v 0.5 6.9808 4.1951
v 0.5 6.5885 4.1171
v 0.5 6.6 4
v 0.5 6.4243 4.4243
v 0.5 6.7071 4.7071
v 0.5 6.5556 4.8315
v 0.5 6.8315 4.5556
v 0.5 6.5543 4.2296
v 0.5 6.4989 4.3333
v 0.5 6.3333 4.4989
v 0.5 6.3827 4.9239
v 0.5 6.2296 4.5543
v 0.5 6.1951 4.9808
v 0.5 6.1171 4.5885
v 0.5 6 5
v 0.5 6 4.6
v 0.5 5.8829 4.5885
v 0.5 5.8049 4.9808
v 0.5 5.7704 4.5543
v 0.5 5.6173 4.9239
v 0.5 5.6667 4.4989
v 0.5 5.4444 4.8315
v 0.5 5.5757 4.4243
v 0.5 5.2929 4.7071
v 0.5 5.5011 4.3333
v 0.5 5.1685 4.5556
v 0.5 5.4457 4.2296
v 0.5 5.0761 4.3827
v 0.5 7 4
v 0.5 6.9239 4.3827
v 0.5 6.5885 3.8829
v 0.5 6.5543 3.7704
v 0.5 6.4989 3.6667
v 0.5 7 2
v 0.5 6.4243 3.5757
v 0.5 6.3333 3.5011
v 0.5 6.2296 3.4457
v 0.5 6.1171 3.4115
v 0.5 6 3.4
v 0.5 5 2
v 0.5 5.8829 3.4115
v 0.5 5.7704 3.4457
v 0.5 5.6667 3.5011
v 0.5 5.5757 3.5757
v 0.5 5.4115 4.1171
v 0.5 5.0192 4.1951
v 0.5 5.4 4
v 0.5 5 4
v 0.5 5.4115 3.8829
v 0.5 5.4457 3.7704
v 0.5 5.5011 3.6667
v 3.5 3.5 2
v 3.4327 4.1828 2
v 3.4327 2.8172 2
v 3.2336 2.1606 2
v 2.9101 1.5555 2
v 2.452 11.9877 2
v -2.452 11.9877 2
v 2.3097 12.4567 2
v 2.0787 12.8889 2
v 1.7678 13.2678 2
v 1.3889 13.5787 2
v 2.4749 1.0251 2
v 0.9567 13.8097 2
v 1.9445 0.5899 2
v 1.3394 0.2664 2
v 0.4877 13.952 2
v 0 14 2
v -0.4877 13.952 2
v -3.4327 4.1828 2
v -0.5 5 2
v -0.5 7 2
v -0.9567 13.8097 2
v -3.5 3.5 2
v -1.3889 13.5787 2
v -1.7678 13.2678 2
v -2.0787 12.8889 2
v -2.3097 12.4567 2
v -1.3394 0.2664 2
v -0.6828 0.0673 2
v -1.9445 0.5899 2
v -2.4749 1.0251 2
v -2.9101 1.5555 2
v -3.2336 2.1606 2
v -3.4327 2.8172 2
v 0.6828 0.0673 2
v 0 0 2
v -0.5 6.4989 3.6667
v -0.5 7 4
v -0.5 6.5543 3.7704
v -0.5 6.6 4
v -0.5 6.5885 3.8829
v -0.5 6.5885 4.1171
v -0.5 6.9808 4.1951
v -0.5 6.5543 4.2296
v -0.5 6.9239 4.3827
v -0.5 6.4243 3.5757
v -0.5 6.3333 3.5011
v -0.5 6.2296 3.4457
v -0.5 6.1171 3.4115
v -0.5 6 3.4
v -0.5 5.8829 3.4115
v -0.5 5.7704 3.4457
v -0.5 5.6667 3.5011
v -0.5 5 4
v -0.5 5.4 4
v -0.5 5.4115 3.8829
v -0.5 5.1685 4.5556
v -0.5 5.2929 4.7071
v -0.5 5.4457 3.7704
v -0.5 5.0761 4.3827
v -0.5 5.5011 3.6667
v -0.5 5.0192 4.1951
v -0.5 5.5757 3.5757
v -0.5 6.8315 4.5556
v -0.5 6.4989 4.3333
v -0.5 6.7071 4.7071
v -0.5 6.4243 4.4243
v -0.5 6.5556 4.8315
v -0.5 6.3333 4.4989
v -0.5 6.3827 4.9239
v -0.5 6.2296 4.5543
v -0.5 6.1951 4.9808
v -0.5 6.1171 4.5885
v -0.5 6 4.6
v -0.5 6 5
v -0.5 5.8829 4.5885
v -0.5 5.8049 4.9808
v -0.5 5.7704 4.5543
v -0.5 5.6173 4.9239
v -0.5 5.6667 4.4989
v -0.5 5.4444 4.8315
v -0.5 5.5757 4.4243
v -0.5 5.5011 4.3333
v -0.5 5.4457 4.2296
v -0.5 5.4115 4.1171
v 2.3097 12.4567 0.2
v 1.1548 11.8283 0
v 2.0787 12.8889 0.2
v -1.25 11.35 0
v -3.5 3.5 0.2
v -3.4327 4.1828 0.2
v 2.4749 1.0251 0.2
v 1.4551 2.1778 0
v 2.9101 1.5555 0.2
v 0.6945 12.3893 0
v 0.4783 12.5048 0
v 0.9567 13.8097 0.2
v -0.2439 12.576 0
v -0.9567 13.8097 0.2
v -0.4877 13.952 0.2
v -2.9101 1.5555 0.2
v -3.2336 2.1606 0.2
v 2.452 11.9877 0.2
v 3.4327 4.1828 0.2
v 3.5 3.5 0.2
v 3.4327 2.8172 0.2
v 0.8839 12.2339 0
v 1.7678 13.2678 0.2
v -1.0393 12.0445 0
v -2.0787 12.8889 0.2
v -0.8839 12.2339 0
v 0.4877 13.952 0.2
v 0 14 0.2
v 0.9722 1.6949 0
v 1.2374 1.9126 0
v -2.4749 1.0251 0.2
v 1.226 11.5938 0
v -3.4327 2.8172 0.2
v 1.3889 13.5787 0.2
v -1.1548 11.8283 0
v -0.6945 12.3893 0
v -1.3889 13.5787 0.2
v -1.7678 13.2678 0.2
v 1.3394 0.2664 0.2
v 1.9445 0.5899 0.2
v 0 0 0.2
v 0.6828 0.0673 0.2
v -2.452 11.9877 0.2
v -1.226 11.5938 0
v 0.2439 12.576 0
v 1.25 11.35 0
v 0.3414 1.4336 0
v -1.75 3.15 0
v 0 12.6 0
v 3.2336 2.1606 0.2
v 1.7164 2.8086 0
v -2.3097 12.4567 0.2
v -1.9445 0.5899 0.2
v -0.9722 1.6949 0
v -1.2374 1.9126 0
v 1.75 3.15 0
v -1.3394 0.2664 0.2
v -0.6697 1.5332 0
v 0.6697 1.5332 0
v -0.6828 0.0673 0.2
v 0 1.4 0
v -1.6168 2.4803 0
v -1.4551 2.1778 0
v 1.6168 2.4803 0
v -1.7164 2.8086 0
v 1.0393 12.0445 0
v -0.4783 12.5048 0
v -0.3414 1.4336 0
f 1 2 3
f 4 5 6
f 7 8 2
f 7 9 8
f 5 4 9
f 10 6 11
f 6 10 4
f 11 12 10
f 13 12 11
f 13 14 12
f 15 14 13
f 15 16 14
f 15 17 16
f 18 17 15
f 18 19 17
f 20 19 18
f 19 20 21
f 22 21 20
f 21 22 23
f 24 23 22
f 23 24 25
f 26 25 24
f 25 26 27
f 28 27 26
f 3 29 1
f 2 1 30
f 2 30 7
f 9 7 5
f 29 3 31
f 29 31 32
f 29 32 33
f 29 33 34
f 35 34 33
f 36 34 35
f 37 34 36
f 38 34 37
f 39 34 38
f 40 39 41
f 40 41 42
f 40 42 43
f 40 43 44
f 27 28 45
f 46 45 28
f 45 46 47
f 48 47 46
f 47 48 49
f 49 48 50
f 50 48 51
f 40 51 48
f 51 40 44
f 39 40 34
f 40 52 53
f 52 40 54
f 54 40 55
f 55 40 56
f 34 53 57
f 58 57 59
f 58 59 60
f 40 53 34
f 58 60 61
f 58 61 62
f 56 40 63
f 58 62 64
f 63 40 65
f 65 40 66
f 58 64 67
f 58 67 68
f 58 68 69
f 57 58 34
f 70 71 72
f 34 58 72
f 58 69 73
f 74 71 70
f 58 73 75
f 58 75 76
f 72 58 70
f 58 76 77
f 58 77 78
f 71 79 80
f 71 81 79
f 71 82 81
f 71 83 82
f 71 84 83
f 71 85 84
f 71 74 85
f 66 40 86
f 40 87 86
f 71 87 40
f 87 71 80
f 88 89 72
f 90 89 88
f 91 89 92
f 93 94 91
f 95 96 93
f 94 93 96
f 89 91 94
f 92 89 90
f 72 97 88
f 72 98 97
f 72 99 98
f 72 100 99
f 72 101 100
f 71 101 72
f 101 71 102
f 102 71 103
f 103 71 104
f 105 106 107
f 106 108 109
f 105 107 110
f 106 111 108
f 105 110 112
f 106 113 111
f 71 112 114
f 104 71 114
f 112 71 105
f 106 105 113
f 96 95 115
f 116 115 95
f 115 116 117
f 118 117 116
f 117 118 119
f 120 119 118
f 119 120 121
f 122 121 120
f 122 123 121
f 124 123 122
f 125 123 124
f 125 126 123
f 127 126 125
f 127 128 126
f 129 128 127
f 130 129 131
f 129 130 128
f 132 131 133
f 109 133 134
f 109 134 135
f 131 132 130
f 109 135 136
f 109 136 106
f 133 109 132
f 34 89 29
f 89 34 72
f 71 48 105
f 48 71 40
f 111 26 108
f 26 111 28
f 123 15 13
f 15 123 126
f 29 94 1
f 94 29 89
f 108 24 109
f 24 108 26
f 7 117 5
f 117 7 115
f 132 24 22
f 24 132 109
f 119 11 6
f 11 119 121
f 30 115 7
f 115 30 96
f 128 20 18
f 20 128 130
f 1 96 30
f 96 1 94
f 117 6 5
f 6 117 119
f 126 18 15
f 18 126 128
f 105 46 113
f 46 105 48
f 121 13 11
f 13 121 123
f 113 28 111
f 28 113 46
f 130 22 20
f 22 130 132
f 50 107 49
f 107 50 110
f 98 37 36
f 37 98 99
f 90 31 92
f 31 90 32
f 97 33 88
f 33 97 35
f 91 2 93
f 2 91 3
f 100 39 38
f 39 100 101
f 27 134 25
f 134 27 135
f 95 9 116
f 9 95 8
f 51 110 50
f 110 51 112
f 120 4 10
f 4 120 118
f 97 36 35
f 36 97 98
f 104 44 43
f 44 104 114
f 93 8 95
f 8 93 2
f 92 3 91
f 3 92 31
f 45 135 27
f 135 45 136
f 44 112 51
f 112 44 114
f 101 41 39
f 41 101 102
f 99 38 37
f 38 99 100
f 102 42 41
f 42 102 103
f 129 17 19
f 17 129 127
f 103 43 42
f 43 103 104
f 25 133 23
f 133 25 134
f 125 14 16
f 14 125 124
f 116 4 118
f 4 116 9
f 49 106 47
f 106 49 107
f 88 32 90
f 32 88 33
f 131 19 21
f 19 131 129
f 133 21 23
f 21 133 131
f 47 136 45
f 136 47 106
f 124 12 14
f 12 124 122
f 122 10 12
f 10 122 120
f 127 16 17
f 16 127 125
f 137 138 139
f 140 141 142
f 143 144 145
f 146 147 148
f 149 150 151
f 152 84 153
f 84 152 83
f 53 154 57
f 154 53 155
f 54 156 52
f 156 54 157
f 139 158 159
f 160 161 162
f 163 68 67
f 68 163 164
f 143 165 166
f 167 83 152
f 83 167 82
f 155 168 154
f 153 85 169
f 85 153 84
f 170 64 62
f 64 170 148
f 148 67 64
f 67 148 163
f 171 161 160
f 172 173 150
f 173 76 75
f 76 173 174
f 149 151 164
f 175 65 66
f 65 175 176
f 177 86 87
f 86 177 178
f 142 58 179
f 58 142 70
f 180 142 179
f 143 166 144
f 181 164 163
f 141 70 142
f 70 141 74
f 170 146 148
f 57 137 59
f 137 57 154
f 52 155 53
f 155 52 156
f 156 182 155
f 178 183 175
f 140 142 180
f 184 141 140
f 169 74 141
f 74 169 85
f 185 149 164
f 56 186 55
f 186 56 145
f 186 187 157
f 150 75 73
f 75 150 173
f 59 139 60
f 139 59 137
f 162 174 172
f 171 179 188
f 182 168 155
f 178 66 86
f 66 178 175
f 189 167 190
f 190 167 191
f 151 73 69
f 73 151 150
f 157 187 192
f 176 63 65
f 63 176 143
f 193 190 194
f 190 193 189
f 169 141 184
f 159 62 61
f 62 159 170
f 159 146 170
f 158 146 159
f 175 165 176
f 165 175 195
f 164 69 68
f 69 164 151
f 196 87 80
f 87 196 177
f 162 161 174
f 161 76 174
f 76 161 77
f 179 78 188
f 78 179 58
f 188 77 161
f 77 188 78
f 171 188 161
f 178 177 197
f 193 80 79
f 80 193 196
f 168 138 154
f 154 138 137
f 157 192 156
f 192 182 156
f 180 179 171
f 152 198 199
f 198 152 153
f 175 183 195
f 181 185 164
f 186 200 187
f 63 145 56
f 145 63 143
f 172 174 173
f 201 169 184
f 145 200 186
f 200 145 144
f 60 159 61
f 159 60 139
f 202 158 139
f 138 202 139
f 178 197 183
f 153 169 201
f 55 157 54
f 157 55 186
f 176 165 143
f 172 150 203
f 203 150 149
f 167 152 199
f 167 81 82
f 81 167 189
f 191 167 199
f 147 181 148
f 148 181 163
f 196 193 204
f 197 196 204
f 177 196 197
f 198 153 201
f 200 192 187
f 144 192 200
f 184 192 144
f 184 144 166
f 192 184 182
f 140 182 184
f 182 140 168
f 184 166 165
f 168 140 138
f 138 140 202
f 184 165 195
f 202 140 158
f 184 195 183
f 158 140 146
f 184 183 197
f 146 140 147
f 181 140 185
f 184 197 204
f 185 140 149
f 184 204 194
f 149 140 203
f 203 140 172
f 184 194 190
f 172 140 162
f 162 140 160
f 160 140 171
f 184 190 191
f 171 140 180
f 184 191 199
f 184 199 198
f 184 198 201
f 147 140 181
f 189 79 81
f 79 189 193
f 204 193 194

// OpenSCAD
R1 = 5 / 2;
R2 = 7 / 2;
H = 2;
L = 14;
CIRCLE_FN = 32;

OFF = 5;


module surf(R1,R2,L,CIRCLE_FN) {
	translate([0,R2,0]){
		M = L-(R1+R2);
		circle(r=R2, $fn=CIRCLE_FN);
		translate([0,L-R2-R1])
			circle(r=R1, $fn=CIRCLE_FN);
		
		translate([-R1,0])
			square([2*R1,M]);
		
		// these are actually not perfect... :(
		polygon([[-R1,0],[-R2,0],[-R1,M]]);
		polygon([[R1,0],[R2,0],[R1,M]]);
	}
}

module base(R1,R2,H,L,CIRCLE_FN) {
	linear_extrude(height=H){
		surf(R1,R2,L,CIRCLE_FN);
	}
}

module rounded_base(R1,R2,H,L,CIRCLE_FN) {
	hull() {
		translate([0,0,H*.1])
			linear_extrude(height=H*.9){
				surf(R1,R2,L,CIRCLE_FN);
			}
		linear_extrude(height=H*.1){
			translate([0,L*.1,0])
			surf(R1*.5,R2*.5,L*.8,CIRCLE_FN);
		}
	}
	
}

rounded_base(R1,R2,H,L,CIRCLE_FN);


translate([-0.5,OFF,2]) {

	difference() {
		union() {
			cube([1,2,2]);
			
			translate([0,1,2])
			rotate([0,90,0])
				cylinder(h=1,r1=1,r2=1,$fn=CIRCLE_FN);
		}
		translate([-1,1,2])
		rotate([0,90,0])
			cylinder(h=3,r1=0.6,r2=0.6,$fn=CIRCLE_FN);
	}
}
